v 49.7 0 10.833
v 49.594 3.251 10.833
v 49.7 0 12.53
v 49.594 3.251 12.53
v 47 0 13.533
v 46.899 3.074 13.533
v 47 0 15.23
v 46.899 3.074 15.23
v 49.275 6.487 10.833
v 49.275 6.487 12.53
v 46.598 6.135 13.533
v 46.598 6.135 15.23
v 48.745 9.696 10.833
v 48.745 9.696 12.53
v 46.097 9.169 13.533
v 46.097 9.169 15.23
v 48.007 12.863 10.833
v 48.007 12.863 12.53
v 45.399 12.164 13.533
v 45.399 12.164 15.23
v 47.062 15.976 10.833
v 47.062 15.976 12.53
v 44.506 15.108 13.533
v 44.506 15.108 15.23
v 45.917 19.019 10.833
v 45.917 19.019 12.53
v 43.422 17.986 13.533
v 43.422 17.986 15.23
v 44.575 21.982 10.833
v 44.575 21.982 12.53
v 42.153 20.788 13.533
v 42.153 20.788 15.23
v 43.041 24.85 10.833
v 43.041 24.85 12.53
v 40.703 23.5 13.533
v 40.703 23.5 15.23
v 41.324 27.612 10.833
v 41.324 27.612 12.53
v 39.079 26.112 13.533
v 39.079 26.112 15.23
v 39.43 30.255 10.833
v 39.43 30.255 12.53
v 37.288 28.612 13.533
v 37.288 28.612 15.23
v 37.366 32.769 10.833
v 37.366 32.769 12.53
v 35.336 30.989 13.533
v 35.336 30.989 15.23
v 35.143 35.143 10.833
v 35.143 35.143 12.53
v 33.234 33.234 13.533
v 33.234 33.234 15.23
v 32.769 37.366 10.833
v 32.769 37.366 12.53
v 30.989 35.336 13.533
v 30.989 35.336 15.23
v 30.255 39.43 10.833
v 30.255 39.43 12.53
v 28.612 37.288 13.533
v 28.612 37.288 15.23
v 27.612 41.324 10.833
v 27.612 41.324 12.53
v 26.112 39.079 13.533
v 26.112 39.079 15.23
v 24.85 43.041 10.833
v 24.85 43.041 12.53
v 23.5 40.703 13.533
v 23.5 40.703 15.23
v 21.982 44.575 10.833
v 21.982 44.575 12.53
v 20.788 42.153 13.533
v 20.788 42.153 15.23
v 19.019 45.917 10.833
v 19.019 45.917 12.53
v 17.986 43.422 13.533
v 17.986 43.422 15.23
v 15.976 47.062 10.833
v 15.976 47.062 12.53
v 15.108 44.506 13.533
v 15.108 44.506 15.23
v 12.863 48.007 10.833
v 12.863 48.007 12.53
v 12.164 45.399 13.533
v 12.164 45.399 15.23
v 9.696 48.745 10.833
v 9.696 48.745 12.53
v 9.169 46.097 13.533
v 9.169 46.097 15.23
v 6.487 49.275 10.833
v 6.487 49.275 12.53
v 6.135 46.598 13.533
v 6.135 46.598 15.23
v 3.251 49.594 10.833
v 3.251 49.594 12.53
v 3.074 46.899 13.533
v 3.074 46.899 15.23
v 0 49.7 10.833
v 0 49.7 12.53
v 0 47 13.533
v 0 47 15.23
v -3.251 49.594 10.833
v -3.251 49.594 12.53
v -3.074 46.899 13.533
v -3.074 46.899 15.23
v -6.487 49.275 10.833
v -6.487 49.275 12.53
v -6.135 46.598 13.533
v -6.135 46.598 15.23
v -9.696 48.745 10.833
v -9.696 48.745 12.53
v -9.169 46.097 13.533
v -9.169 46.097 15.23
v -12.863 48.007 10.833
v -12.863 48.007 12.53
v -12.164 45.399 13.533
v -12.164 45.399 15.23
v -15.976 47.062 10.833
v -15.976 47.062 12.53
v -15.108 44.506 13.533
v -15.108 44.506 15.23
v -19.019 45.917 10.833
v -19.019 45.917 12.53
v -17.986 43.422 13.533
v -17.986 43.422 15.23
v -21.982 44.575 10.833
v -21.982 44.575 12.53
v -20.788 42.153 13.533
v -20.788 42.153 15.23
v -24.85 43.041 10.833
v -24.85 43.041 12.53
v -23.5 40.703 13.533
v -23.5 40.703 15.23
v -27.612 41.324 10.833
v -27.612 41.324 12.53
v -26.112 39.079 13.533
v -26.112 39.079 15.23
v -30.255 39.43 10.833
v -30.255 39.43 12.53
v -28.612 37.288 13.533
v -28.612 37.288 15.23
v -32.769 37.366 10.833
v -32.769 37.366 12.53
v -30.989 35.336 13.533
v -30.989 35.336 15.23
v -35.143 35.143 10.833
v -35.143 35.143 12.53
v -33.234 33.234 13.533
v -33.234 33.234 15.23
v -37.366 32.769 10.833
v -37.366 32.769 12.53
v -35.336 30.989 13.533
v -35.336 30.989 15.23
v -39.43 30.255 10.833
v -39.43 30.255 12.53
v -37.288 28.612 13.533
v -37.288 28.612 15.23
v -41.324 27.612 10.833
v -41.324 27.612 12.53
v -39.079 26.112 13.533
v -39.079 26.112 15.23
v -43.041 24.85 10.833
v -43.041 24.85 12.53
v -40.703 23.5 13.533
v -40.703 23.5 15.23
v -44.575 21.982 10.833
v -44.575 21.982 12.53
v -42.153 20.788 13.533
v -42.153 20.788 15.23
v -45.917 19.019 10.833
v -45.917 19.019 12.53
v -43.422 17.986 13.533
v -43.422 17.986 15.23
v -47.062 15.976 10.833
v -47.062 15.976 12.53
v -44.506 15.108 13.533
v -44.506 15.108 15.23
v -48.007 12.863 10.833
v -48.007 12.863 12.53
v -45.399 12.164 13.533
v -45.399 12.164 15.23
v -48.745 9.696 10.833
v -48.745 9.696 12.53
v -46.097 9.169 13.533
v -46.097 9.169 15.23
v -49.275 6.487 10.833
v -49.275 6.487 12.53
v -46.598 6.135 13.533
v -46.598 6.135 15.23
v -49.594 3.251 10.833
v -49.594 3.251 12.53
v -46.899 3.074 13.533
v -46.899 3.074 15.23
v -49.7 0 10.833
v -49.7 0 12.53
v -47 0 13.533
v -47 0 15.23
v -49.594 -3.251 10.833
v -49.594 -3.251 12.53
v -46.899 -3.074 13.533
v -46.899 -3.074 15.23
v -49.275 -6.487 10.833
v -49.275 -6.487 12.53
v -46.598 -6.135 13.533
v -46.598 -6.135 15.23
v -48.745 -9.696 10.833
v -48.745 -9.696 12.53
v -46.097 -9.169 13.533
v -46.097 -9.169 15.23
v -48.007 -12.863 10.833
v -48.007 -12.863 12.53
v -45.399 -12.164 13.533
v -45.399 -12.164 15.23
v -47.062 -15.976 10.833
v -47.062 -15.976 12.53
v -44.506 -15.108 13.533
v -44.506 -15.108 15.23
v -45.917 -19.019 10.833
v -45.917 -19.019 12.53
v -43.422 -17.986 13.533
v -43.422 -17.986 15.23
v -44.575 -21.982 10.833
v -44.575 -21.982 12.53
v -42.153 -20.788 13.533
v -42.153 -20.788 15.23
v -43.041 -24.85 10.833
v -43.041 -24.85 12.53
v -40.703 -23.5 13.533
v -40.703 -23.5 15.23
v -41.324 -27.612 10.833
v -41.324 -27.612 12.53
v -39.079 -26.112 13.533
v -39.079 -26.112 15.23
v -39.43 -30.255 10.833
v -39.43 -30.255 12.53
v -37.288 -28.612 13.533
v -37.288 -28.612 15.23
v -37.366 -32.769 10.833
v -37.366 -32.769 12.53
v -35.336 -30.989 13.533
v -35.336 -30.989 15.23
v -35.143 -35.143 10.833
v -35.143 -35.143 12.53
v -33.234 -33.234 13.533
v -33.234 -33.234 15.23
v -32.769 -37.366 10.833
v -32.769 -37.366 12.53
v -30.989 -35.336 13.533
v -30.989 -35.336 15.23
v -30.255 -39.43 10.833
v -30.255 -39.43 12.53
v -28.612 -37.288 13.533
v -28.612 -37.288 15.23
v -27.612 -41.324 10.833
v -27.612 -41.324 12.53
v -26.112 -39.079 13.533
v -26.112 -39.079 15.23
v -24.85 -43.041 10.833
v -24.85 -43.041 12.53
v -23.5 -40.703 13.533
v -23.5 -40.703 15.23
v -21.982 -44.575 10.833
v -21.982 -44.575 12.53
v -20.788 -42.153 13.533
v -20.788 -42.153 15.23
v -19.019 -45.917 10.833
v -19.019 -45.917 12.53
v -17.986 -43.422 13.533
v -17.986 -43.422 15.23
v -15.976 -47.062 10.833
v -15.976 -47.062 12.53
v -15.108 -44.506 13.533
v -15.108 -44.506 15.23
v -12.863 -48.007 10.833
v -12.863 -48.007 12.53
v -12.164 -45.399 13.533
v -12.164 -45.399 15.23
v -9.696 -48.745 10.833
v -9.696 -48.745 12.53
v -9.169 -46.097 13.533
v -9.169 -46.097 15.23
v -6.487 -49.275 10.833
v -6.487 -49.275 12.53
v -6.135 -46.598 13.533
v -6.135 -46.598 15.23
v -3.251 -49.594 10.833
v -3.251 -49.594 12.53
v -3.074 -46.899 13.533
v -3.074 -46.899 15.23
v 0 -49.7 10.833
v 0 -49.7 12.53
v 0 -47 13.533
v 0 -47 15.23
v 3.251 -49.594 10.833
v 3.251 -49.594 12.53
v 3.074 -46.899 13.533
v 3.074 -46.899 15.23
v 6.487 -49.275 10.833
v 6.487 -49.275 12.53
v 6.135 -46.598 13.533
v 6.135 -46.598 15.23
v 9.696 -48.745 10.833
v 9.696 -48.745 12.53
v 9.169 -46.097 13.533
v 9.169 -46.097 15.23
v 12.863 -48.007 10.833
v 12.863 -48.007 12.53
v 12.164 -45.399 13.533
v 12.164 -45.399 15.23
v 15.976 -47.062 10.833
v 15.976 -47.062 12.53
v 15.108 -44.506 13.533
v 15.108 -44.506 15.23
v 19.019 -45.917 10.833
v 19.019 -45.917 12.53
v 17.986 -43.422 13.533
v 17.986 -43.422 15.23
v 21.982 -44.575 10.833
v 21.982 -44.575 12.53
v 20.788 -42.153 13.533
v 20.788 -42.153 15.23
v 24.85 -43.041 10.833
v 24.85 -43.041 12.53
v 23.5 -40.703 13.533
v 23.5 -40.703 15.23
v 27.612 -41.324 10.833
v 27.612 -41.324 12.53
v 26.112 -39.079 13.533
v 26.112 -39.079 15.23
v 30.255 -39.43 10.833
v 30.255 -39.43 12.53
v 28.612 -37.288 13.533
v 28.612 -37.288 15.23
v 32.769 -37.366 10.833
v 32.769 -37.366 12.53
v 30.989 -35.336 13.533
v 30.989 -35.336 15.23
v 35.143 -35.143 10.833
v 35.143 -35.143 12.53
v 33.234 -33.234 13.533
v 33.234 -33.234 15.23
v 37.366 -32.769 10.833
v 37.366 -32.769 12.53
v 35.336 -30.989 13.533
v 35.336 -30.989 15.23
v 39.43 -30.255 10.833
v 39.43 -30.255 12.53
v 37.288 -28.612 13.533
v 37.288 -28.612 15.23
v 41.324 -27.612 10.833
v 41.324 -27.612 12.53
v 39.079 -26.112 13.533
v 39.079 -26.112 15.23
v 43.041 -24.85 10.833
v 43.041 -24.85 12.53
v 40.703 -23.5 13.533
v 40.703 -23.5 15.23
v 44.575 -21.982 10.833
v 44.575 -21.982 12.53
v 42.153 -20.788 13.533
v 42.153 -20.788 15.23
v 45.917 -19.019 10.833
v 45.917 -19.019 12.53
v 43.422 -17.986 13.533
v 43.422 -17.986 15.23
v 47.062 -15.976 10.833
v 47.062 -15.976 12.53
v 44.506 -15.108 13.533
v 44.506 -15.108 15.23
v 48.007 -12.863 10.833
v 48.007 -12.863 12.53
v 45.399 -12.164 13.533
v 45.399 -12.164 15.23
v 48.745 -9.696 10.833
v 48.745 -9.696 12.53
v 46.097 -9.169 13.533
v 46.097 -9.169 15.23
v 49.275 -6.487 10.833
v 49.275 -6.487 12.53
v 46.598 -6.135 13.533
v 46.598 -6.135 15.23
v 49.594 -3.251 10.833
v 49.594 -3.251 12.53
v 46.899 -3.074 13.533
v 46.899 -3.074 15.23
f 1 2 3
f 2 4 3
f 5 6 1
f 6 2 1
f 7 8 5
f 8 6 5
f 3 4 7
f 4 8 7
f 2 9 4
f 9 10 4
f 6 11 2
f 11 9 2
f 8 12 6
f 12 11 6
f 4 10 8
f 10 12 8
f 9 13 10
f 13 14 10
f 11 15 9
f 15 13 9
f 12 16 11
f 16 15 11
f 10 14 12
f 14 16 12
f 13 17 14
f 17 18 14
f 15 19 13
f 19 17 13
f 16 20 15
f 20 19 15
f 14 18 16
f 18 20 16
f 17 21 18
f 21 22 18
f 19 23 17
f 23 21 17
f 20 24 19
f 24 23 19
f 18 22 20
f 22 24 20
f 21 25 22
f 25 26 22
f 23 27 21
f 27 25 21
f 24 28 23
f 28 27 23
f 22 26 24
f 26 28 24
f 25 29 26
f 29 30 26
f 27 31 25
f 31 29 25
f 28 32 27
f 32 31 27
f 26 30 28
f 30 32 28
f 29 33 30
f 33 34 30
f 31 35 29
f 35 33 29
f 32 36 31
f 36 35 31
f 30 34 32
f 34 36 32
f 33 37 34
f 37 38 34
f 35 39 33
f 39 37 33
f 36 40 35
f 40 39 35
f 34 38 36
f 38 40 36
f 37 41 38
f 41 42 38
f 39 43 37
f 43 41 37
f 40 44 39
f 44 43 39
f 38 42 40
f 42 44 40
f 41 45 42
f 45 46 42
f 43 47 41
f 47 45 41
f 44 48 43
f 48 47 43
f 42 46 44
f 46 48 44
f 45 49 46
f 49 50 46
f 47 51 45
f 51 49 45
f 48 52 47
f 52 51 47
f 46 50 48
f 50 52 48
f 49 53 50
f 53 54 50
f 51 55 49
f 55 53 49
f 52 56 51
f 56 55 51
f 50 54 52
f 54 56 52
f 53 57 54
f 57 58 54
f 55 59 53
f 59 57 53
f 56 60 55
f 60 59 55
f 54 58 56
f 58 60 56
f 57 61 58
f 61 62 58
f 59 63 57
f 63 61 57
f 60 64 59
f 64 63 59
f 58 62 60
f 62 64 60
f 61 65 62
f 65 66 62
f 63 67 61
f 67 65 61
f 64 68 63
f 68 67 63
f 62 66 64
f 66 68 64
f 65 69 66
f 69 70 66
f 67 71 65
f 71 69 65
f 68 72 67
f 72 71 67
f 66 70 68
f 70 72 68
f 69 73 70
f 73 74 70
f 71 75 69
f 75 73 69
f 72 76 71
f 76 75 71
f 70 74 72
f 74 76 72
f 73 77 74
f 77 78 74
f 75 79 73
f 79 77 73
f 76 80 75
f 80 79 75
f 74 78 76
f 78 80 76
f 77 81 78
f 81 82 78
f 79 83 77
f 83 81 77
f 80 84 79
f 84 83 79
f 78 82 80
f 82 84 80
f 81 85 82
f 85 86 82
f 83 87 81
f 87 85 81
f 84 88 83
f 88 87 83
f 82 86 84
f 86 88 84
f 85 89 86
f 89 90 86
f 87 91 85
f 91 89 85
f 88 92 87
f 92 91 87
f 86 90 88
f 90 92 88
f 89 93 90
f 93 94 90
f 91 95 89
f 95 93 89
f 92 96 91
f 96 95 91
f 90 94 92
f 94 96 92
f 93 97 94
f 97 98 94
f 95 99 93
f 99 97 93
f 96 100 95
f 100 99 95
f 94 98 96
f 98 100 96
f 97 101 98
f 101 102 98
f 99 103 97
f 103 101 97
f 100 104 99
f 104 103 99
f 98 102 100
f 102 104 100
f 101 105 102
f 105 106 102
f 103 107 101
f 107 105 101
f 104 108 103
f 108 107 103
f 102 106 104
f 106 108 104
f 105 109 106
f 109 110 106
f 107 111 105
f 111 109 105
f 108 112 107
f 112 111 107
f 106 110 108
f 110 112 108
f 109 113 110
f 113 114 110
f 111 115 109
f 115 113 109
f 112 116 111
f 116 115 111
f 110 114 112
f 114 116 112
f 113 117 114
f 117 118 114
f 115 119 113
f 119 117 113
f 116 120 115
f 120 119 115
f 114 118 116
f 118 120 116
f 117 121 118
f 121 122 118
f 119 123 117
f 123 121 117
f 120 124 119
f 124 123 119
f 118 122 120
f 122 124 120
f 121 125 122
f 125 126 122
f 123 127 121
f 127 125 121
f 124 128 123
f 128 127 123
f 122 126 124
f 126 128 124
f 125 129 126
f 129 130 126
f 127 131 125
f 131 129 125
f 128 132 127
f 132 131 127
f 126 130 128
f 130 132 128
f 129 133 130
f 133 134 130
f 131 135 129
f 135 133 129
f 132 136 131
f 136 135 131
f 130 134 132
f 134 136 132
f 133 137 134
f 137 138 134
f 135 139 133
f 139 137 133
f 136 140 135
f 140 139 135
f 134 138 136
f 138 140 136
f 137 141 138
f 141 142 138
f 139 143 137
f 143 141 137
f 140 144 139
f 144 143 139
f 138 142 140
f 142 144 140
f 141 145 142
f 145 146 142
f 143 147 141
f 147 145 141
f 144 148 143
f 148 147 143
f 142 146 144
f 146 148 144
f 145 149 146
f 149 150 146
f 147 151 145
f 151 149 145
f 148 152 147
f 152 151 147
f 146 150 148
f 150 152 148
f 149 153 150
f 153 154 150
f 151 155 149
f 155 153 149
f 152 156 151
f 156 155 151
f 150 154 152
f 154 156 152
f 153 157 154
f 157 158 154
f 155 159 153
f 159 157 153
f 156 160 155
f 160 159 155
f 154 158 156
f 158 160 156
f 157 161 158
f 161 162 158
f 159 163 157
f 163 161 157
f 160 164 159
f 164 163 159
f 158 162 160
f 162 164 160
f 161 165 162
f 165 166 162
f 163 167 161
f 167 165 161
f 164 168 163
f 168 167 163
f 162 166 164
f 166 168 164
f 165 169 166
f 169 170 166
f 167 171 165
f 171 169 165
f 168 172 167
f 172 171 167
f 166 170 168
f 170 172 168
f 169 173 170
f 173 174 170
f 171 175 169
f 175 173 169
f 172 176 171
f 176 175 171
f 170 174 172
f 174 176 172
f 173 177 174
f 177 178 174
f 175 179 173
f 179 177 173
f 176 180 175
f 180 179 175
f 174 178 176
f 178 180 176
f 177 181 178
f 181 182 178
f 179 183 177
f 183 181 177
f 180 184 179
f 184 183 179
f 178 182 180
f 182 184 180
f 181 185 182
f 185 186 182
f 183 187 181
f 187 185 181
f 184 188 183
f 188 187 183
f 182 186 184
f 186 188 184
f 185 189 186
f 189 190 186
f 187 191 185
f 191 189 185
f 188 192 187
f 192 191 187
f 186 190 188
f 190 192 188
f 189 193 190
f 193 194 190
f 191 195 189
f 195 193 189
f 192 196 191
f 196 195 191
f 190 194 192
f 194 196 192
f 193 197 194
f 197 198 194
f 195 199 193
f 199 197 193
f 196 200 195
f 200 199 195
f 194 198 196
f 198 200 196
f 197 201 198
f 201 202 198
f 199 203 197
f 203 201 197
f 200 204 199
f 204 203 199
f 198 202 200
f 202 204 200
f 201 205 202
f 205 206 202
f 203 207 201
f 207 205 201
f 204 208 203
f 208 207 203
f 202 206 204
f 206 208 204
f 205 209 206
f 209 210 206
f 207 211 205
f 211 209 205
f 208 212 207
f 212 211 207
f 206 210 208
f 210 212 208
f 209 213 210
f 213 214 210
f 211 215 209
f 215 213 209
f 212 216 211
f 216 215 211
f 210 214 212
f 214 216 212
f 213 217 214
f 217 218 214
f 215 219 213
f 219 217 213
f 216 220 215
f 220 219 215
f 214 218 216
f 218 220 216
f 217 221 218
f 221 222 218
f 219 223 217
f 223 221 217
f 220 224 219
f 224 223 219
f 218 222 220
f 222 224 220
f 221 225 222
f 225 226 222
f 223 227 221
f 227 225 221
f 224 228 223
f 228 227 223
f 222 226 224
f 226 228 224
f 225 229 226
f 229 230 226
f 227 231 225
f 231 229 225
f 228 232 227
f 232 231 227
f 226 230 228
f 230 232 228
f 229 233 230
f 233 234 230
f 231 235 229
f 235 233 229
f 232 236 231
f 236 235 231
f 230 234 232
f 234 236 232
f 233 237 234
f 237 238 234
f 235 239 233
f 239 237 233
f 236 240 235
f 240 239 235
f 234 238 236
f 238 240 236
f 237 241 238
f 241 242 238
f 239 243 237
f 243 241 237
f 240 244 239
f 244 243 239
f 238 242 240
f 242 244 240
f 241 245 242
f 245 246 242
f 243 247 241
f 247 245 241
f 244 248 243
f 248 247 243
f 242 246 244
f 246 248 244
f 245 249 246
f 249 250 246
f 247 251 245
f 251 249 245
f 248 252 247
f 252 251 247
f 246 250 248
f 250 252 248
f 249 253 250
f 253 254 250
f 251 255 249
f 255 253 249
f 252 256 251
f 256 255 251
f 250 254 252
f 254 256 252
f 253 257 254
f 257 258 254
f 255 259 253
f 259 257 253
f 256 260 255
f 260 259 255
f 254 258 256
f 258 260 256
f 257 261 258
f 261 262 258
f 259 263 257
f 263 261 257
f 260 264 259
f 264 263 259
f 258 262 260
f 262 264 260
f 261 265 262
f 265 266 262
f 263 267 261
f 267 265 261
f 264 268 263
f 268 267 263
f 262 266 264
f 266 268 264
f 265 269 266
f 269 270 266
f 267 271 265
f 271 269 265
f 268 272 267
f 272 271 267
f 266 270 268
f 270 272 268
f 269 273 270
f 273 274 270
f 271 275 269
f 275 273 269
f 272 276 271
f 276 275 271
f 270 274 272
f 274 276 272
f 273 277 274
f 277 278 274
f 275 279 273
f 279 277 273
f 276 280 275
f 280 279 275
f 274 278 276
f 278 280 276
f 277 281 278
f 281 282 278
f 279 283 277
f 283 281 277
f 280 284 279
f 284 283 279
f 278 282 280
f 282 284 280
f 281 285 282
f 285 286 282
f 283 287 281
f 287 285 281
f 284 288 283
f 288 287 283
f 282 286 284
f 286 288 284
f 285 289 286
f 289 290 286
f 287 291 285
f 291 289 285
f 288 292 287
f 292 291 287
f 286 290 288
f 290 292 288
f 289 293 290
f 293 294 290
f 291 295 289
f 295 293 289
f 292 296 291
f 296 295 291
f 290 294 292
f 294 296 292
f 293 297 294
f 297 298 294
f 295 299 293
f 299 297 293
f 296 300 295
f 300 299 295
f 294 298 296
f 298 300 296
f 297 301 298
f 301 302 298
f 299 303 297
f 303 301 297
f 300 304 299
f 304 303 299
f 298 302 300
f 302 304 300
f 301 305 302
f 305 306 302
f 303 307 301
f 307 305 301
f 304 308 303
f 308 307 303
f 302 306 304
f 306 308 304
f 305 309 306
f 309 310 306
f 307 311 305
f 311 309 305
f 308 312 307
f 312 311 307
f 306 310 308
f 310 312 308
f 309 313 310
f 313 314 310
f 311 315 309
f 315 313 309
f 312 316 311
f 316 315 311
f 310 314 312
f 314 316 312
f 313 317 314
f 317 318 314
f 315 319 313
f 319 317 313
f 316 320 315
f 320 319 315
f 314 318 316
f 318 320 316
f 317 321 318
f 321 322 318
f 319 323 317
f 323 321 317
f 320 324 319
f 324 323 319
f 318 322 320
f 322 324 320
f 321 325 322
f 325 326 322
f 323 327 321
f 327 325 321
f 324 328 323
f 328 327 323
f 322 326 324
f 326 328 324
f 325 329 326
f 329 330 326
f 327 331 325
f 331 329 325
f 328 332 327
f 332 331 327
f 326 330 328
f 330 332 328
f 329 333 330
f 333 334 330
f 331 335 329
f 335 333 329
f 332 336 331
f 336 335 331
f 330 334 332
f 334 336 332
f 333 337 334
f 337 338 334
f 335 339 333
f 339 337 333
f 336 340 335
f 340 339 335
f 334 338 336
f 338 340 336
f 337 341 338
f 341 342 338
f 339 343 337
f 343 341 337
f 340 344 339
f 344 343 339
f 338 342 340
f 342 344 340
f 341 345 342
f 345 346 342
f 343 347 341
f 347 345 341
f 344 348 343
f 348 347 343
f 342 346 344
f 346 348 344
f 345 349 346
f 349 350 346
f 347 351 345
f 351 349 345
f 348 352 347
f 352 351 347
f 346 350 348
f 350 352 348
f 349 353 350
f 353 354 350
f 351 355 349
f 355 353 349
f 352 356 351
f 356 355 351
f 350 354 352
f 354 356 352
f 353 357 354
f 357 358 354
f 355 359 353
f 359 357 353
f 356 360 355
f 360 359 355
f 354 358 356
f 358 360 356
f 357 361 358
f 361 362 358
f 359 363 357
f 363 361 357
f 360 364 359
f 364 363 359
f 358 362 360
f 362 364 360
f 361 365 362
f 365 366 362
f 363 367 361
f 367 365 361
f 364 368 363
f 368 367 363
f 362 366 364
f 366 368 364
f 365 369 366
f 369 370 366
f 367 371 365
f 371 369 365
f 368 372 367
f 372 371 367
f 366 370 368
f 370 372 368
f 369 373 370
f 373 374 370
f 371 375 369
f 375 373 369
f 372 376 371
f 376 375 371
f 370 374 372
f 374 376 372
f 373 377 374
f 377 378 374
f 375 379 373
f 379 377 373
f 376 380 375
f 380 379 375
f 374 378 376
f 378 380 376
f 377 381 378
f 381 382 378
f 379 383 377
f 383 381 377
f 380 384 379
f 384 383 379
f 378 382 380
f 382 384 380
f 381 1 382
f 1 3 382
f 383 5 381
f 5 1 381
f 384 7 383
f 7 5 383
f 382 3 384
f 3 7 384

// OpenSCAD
include <../lib/servo-duct-manifold-lib.scad>;
$fn = 96;
tube_gasket();
